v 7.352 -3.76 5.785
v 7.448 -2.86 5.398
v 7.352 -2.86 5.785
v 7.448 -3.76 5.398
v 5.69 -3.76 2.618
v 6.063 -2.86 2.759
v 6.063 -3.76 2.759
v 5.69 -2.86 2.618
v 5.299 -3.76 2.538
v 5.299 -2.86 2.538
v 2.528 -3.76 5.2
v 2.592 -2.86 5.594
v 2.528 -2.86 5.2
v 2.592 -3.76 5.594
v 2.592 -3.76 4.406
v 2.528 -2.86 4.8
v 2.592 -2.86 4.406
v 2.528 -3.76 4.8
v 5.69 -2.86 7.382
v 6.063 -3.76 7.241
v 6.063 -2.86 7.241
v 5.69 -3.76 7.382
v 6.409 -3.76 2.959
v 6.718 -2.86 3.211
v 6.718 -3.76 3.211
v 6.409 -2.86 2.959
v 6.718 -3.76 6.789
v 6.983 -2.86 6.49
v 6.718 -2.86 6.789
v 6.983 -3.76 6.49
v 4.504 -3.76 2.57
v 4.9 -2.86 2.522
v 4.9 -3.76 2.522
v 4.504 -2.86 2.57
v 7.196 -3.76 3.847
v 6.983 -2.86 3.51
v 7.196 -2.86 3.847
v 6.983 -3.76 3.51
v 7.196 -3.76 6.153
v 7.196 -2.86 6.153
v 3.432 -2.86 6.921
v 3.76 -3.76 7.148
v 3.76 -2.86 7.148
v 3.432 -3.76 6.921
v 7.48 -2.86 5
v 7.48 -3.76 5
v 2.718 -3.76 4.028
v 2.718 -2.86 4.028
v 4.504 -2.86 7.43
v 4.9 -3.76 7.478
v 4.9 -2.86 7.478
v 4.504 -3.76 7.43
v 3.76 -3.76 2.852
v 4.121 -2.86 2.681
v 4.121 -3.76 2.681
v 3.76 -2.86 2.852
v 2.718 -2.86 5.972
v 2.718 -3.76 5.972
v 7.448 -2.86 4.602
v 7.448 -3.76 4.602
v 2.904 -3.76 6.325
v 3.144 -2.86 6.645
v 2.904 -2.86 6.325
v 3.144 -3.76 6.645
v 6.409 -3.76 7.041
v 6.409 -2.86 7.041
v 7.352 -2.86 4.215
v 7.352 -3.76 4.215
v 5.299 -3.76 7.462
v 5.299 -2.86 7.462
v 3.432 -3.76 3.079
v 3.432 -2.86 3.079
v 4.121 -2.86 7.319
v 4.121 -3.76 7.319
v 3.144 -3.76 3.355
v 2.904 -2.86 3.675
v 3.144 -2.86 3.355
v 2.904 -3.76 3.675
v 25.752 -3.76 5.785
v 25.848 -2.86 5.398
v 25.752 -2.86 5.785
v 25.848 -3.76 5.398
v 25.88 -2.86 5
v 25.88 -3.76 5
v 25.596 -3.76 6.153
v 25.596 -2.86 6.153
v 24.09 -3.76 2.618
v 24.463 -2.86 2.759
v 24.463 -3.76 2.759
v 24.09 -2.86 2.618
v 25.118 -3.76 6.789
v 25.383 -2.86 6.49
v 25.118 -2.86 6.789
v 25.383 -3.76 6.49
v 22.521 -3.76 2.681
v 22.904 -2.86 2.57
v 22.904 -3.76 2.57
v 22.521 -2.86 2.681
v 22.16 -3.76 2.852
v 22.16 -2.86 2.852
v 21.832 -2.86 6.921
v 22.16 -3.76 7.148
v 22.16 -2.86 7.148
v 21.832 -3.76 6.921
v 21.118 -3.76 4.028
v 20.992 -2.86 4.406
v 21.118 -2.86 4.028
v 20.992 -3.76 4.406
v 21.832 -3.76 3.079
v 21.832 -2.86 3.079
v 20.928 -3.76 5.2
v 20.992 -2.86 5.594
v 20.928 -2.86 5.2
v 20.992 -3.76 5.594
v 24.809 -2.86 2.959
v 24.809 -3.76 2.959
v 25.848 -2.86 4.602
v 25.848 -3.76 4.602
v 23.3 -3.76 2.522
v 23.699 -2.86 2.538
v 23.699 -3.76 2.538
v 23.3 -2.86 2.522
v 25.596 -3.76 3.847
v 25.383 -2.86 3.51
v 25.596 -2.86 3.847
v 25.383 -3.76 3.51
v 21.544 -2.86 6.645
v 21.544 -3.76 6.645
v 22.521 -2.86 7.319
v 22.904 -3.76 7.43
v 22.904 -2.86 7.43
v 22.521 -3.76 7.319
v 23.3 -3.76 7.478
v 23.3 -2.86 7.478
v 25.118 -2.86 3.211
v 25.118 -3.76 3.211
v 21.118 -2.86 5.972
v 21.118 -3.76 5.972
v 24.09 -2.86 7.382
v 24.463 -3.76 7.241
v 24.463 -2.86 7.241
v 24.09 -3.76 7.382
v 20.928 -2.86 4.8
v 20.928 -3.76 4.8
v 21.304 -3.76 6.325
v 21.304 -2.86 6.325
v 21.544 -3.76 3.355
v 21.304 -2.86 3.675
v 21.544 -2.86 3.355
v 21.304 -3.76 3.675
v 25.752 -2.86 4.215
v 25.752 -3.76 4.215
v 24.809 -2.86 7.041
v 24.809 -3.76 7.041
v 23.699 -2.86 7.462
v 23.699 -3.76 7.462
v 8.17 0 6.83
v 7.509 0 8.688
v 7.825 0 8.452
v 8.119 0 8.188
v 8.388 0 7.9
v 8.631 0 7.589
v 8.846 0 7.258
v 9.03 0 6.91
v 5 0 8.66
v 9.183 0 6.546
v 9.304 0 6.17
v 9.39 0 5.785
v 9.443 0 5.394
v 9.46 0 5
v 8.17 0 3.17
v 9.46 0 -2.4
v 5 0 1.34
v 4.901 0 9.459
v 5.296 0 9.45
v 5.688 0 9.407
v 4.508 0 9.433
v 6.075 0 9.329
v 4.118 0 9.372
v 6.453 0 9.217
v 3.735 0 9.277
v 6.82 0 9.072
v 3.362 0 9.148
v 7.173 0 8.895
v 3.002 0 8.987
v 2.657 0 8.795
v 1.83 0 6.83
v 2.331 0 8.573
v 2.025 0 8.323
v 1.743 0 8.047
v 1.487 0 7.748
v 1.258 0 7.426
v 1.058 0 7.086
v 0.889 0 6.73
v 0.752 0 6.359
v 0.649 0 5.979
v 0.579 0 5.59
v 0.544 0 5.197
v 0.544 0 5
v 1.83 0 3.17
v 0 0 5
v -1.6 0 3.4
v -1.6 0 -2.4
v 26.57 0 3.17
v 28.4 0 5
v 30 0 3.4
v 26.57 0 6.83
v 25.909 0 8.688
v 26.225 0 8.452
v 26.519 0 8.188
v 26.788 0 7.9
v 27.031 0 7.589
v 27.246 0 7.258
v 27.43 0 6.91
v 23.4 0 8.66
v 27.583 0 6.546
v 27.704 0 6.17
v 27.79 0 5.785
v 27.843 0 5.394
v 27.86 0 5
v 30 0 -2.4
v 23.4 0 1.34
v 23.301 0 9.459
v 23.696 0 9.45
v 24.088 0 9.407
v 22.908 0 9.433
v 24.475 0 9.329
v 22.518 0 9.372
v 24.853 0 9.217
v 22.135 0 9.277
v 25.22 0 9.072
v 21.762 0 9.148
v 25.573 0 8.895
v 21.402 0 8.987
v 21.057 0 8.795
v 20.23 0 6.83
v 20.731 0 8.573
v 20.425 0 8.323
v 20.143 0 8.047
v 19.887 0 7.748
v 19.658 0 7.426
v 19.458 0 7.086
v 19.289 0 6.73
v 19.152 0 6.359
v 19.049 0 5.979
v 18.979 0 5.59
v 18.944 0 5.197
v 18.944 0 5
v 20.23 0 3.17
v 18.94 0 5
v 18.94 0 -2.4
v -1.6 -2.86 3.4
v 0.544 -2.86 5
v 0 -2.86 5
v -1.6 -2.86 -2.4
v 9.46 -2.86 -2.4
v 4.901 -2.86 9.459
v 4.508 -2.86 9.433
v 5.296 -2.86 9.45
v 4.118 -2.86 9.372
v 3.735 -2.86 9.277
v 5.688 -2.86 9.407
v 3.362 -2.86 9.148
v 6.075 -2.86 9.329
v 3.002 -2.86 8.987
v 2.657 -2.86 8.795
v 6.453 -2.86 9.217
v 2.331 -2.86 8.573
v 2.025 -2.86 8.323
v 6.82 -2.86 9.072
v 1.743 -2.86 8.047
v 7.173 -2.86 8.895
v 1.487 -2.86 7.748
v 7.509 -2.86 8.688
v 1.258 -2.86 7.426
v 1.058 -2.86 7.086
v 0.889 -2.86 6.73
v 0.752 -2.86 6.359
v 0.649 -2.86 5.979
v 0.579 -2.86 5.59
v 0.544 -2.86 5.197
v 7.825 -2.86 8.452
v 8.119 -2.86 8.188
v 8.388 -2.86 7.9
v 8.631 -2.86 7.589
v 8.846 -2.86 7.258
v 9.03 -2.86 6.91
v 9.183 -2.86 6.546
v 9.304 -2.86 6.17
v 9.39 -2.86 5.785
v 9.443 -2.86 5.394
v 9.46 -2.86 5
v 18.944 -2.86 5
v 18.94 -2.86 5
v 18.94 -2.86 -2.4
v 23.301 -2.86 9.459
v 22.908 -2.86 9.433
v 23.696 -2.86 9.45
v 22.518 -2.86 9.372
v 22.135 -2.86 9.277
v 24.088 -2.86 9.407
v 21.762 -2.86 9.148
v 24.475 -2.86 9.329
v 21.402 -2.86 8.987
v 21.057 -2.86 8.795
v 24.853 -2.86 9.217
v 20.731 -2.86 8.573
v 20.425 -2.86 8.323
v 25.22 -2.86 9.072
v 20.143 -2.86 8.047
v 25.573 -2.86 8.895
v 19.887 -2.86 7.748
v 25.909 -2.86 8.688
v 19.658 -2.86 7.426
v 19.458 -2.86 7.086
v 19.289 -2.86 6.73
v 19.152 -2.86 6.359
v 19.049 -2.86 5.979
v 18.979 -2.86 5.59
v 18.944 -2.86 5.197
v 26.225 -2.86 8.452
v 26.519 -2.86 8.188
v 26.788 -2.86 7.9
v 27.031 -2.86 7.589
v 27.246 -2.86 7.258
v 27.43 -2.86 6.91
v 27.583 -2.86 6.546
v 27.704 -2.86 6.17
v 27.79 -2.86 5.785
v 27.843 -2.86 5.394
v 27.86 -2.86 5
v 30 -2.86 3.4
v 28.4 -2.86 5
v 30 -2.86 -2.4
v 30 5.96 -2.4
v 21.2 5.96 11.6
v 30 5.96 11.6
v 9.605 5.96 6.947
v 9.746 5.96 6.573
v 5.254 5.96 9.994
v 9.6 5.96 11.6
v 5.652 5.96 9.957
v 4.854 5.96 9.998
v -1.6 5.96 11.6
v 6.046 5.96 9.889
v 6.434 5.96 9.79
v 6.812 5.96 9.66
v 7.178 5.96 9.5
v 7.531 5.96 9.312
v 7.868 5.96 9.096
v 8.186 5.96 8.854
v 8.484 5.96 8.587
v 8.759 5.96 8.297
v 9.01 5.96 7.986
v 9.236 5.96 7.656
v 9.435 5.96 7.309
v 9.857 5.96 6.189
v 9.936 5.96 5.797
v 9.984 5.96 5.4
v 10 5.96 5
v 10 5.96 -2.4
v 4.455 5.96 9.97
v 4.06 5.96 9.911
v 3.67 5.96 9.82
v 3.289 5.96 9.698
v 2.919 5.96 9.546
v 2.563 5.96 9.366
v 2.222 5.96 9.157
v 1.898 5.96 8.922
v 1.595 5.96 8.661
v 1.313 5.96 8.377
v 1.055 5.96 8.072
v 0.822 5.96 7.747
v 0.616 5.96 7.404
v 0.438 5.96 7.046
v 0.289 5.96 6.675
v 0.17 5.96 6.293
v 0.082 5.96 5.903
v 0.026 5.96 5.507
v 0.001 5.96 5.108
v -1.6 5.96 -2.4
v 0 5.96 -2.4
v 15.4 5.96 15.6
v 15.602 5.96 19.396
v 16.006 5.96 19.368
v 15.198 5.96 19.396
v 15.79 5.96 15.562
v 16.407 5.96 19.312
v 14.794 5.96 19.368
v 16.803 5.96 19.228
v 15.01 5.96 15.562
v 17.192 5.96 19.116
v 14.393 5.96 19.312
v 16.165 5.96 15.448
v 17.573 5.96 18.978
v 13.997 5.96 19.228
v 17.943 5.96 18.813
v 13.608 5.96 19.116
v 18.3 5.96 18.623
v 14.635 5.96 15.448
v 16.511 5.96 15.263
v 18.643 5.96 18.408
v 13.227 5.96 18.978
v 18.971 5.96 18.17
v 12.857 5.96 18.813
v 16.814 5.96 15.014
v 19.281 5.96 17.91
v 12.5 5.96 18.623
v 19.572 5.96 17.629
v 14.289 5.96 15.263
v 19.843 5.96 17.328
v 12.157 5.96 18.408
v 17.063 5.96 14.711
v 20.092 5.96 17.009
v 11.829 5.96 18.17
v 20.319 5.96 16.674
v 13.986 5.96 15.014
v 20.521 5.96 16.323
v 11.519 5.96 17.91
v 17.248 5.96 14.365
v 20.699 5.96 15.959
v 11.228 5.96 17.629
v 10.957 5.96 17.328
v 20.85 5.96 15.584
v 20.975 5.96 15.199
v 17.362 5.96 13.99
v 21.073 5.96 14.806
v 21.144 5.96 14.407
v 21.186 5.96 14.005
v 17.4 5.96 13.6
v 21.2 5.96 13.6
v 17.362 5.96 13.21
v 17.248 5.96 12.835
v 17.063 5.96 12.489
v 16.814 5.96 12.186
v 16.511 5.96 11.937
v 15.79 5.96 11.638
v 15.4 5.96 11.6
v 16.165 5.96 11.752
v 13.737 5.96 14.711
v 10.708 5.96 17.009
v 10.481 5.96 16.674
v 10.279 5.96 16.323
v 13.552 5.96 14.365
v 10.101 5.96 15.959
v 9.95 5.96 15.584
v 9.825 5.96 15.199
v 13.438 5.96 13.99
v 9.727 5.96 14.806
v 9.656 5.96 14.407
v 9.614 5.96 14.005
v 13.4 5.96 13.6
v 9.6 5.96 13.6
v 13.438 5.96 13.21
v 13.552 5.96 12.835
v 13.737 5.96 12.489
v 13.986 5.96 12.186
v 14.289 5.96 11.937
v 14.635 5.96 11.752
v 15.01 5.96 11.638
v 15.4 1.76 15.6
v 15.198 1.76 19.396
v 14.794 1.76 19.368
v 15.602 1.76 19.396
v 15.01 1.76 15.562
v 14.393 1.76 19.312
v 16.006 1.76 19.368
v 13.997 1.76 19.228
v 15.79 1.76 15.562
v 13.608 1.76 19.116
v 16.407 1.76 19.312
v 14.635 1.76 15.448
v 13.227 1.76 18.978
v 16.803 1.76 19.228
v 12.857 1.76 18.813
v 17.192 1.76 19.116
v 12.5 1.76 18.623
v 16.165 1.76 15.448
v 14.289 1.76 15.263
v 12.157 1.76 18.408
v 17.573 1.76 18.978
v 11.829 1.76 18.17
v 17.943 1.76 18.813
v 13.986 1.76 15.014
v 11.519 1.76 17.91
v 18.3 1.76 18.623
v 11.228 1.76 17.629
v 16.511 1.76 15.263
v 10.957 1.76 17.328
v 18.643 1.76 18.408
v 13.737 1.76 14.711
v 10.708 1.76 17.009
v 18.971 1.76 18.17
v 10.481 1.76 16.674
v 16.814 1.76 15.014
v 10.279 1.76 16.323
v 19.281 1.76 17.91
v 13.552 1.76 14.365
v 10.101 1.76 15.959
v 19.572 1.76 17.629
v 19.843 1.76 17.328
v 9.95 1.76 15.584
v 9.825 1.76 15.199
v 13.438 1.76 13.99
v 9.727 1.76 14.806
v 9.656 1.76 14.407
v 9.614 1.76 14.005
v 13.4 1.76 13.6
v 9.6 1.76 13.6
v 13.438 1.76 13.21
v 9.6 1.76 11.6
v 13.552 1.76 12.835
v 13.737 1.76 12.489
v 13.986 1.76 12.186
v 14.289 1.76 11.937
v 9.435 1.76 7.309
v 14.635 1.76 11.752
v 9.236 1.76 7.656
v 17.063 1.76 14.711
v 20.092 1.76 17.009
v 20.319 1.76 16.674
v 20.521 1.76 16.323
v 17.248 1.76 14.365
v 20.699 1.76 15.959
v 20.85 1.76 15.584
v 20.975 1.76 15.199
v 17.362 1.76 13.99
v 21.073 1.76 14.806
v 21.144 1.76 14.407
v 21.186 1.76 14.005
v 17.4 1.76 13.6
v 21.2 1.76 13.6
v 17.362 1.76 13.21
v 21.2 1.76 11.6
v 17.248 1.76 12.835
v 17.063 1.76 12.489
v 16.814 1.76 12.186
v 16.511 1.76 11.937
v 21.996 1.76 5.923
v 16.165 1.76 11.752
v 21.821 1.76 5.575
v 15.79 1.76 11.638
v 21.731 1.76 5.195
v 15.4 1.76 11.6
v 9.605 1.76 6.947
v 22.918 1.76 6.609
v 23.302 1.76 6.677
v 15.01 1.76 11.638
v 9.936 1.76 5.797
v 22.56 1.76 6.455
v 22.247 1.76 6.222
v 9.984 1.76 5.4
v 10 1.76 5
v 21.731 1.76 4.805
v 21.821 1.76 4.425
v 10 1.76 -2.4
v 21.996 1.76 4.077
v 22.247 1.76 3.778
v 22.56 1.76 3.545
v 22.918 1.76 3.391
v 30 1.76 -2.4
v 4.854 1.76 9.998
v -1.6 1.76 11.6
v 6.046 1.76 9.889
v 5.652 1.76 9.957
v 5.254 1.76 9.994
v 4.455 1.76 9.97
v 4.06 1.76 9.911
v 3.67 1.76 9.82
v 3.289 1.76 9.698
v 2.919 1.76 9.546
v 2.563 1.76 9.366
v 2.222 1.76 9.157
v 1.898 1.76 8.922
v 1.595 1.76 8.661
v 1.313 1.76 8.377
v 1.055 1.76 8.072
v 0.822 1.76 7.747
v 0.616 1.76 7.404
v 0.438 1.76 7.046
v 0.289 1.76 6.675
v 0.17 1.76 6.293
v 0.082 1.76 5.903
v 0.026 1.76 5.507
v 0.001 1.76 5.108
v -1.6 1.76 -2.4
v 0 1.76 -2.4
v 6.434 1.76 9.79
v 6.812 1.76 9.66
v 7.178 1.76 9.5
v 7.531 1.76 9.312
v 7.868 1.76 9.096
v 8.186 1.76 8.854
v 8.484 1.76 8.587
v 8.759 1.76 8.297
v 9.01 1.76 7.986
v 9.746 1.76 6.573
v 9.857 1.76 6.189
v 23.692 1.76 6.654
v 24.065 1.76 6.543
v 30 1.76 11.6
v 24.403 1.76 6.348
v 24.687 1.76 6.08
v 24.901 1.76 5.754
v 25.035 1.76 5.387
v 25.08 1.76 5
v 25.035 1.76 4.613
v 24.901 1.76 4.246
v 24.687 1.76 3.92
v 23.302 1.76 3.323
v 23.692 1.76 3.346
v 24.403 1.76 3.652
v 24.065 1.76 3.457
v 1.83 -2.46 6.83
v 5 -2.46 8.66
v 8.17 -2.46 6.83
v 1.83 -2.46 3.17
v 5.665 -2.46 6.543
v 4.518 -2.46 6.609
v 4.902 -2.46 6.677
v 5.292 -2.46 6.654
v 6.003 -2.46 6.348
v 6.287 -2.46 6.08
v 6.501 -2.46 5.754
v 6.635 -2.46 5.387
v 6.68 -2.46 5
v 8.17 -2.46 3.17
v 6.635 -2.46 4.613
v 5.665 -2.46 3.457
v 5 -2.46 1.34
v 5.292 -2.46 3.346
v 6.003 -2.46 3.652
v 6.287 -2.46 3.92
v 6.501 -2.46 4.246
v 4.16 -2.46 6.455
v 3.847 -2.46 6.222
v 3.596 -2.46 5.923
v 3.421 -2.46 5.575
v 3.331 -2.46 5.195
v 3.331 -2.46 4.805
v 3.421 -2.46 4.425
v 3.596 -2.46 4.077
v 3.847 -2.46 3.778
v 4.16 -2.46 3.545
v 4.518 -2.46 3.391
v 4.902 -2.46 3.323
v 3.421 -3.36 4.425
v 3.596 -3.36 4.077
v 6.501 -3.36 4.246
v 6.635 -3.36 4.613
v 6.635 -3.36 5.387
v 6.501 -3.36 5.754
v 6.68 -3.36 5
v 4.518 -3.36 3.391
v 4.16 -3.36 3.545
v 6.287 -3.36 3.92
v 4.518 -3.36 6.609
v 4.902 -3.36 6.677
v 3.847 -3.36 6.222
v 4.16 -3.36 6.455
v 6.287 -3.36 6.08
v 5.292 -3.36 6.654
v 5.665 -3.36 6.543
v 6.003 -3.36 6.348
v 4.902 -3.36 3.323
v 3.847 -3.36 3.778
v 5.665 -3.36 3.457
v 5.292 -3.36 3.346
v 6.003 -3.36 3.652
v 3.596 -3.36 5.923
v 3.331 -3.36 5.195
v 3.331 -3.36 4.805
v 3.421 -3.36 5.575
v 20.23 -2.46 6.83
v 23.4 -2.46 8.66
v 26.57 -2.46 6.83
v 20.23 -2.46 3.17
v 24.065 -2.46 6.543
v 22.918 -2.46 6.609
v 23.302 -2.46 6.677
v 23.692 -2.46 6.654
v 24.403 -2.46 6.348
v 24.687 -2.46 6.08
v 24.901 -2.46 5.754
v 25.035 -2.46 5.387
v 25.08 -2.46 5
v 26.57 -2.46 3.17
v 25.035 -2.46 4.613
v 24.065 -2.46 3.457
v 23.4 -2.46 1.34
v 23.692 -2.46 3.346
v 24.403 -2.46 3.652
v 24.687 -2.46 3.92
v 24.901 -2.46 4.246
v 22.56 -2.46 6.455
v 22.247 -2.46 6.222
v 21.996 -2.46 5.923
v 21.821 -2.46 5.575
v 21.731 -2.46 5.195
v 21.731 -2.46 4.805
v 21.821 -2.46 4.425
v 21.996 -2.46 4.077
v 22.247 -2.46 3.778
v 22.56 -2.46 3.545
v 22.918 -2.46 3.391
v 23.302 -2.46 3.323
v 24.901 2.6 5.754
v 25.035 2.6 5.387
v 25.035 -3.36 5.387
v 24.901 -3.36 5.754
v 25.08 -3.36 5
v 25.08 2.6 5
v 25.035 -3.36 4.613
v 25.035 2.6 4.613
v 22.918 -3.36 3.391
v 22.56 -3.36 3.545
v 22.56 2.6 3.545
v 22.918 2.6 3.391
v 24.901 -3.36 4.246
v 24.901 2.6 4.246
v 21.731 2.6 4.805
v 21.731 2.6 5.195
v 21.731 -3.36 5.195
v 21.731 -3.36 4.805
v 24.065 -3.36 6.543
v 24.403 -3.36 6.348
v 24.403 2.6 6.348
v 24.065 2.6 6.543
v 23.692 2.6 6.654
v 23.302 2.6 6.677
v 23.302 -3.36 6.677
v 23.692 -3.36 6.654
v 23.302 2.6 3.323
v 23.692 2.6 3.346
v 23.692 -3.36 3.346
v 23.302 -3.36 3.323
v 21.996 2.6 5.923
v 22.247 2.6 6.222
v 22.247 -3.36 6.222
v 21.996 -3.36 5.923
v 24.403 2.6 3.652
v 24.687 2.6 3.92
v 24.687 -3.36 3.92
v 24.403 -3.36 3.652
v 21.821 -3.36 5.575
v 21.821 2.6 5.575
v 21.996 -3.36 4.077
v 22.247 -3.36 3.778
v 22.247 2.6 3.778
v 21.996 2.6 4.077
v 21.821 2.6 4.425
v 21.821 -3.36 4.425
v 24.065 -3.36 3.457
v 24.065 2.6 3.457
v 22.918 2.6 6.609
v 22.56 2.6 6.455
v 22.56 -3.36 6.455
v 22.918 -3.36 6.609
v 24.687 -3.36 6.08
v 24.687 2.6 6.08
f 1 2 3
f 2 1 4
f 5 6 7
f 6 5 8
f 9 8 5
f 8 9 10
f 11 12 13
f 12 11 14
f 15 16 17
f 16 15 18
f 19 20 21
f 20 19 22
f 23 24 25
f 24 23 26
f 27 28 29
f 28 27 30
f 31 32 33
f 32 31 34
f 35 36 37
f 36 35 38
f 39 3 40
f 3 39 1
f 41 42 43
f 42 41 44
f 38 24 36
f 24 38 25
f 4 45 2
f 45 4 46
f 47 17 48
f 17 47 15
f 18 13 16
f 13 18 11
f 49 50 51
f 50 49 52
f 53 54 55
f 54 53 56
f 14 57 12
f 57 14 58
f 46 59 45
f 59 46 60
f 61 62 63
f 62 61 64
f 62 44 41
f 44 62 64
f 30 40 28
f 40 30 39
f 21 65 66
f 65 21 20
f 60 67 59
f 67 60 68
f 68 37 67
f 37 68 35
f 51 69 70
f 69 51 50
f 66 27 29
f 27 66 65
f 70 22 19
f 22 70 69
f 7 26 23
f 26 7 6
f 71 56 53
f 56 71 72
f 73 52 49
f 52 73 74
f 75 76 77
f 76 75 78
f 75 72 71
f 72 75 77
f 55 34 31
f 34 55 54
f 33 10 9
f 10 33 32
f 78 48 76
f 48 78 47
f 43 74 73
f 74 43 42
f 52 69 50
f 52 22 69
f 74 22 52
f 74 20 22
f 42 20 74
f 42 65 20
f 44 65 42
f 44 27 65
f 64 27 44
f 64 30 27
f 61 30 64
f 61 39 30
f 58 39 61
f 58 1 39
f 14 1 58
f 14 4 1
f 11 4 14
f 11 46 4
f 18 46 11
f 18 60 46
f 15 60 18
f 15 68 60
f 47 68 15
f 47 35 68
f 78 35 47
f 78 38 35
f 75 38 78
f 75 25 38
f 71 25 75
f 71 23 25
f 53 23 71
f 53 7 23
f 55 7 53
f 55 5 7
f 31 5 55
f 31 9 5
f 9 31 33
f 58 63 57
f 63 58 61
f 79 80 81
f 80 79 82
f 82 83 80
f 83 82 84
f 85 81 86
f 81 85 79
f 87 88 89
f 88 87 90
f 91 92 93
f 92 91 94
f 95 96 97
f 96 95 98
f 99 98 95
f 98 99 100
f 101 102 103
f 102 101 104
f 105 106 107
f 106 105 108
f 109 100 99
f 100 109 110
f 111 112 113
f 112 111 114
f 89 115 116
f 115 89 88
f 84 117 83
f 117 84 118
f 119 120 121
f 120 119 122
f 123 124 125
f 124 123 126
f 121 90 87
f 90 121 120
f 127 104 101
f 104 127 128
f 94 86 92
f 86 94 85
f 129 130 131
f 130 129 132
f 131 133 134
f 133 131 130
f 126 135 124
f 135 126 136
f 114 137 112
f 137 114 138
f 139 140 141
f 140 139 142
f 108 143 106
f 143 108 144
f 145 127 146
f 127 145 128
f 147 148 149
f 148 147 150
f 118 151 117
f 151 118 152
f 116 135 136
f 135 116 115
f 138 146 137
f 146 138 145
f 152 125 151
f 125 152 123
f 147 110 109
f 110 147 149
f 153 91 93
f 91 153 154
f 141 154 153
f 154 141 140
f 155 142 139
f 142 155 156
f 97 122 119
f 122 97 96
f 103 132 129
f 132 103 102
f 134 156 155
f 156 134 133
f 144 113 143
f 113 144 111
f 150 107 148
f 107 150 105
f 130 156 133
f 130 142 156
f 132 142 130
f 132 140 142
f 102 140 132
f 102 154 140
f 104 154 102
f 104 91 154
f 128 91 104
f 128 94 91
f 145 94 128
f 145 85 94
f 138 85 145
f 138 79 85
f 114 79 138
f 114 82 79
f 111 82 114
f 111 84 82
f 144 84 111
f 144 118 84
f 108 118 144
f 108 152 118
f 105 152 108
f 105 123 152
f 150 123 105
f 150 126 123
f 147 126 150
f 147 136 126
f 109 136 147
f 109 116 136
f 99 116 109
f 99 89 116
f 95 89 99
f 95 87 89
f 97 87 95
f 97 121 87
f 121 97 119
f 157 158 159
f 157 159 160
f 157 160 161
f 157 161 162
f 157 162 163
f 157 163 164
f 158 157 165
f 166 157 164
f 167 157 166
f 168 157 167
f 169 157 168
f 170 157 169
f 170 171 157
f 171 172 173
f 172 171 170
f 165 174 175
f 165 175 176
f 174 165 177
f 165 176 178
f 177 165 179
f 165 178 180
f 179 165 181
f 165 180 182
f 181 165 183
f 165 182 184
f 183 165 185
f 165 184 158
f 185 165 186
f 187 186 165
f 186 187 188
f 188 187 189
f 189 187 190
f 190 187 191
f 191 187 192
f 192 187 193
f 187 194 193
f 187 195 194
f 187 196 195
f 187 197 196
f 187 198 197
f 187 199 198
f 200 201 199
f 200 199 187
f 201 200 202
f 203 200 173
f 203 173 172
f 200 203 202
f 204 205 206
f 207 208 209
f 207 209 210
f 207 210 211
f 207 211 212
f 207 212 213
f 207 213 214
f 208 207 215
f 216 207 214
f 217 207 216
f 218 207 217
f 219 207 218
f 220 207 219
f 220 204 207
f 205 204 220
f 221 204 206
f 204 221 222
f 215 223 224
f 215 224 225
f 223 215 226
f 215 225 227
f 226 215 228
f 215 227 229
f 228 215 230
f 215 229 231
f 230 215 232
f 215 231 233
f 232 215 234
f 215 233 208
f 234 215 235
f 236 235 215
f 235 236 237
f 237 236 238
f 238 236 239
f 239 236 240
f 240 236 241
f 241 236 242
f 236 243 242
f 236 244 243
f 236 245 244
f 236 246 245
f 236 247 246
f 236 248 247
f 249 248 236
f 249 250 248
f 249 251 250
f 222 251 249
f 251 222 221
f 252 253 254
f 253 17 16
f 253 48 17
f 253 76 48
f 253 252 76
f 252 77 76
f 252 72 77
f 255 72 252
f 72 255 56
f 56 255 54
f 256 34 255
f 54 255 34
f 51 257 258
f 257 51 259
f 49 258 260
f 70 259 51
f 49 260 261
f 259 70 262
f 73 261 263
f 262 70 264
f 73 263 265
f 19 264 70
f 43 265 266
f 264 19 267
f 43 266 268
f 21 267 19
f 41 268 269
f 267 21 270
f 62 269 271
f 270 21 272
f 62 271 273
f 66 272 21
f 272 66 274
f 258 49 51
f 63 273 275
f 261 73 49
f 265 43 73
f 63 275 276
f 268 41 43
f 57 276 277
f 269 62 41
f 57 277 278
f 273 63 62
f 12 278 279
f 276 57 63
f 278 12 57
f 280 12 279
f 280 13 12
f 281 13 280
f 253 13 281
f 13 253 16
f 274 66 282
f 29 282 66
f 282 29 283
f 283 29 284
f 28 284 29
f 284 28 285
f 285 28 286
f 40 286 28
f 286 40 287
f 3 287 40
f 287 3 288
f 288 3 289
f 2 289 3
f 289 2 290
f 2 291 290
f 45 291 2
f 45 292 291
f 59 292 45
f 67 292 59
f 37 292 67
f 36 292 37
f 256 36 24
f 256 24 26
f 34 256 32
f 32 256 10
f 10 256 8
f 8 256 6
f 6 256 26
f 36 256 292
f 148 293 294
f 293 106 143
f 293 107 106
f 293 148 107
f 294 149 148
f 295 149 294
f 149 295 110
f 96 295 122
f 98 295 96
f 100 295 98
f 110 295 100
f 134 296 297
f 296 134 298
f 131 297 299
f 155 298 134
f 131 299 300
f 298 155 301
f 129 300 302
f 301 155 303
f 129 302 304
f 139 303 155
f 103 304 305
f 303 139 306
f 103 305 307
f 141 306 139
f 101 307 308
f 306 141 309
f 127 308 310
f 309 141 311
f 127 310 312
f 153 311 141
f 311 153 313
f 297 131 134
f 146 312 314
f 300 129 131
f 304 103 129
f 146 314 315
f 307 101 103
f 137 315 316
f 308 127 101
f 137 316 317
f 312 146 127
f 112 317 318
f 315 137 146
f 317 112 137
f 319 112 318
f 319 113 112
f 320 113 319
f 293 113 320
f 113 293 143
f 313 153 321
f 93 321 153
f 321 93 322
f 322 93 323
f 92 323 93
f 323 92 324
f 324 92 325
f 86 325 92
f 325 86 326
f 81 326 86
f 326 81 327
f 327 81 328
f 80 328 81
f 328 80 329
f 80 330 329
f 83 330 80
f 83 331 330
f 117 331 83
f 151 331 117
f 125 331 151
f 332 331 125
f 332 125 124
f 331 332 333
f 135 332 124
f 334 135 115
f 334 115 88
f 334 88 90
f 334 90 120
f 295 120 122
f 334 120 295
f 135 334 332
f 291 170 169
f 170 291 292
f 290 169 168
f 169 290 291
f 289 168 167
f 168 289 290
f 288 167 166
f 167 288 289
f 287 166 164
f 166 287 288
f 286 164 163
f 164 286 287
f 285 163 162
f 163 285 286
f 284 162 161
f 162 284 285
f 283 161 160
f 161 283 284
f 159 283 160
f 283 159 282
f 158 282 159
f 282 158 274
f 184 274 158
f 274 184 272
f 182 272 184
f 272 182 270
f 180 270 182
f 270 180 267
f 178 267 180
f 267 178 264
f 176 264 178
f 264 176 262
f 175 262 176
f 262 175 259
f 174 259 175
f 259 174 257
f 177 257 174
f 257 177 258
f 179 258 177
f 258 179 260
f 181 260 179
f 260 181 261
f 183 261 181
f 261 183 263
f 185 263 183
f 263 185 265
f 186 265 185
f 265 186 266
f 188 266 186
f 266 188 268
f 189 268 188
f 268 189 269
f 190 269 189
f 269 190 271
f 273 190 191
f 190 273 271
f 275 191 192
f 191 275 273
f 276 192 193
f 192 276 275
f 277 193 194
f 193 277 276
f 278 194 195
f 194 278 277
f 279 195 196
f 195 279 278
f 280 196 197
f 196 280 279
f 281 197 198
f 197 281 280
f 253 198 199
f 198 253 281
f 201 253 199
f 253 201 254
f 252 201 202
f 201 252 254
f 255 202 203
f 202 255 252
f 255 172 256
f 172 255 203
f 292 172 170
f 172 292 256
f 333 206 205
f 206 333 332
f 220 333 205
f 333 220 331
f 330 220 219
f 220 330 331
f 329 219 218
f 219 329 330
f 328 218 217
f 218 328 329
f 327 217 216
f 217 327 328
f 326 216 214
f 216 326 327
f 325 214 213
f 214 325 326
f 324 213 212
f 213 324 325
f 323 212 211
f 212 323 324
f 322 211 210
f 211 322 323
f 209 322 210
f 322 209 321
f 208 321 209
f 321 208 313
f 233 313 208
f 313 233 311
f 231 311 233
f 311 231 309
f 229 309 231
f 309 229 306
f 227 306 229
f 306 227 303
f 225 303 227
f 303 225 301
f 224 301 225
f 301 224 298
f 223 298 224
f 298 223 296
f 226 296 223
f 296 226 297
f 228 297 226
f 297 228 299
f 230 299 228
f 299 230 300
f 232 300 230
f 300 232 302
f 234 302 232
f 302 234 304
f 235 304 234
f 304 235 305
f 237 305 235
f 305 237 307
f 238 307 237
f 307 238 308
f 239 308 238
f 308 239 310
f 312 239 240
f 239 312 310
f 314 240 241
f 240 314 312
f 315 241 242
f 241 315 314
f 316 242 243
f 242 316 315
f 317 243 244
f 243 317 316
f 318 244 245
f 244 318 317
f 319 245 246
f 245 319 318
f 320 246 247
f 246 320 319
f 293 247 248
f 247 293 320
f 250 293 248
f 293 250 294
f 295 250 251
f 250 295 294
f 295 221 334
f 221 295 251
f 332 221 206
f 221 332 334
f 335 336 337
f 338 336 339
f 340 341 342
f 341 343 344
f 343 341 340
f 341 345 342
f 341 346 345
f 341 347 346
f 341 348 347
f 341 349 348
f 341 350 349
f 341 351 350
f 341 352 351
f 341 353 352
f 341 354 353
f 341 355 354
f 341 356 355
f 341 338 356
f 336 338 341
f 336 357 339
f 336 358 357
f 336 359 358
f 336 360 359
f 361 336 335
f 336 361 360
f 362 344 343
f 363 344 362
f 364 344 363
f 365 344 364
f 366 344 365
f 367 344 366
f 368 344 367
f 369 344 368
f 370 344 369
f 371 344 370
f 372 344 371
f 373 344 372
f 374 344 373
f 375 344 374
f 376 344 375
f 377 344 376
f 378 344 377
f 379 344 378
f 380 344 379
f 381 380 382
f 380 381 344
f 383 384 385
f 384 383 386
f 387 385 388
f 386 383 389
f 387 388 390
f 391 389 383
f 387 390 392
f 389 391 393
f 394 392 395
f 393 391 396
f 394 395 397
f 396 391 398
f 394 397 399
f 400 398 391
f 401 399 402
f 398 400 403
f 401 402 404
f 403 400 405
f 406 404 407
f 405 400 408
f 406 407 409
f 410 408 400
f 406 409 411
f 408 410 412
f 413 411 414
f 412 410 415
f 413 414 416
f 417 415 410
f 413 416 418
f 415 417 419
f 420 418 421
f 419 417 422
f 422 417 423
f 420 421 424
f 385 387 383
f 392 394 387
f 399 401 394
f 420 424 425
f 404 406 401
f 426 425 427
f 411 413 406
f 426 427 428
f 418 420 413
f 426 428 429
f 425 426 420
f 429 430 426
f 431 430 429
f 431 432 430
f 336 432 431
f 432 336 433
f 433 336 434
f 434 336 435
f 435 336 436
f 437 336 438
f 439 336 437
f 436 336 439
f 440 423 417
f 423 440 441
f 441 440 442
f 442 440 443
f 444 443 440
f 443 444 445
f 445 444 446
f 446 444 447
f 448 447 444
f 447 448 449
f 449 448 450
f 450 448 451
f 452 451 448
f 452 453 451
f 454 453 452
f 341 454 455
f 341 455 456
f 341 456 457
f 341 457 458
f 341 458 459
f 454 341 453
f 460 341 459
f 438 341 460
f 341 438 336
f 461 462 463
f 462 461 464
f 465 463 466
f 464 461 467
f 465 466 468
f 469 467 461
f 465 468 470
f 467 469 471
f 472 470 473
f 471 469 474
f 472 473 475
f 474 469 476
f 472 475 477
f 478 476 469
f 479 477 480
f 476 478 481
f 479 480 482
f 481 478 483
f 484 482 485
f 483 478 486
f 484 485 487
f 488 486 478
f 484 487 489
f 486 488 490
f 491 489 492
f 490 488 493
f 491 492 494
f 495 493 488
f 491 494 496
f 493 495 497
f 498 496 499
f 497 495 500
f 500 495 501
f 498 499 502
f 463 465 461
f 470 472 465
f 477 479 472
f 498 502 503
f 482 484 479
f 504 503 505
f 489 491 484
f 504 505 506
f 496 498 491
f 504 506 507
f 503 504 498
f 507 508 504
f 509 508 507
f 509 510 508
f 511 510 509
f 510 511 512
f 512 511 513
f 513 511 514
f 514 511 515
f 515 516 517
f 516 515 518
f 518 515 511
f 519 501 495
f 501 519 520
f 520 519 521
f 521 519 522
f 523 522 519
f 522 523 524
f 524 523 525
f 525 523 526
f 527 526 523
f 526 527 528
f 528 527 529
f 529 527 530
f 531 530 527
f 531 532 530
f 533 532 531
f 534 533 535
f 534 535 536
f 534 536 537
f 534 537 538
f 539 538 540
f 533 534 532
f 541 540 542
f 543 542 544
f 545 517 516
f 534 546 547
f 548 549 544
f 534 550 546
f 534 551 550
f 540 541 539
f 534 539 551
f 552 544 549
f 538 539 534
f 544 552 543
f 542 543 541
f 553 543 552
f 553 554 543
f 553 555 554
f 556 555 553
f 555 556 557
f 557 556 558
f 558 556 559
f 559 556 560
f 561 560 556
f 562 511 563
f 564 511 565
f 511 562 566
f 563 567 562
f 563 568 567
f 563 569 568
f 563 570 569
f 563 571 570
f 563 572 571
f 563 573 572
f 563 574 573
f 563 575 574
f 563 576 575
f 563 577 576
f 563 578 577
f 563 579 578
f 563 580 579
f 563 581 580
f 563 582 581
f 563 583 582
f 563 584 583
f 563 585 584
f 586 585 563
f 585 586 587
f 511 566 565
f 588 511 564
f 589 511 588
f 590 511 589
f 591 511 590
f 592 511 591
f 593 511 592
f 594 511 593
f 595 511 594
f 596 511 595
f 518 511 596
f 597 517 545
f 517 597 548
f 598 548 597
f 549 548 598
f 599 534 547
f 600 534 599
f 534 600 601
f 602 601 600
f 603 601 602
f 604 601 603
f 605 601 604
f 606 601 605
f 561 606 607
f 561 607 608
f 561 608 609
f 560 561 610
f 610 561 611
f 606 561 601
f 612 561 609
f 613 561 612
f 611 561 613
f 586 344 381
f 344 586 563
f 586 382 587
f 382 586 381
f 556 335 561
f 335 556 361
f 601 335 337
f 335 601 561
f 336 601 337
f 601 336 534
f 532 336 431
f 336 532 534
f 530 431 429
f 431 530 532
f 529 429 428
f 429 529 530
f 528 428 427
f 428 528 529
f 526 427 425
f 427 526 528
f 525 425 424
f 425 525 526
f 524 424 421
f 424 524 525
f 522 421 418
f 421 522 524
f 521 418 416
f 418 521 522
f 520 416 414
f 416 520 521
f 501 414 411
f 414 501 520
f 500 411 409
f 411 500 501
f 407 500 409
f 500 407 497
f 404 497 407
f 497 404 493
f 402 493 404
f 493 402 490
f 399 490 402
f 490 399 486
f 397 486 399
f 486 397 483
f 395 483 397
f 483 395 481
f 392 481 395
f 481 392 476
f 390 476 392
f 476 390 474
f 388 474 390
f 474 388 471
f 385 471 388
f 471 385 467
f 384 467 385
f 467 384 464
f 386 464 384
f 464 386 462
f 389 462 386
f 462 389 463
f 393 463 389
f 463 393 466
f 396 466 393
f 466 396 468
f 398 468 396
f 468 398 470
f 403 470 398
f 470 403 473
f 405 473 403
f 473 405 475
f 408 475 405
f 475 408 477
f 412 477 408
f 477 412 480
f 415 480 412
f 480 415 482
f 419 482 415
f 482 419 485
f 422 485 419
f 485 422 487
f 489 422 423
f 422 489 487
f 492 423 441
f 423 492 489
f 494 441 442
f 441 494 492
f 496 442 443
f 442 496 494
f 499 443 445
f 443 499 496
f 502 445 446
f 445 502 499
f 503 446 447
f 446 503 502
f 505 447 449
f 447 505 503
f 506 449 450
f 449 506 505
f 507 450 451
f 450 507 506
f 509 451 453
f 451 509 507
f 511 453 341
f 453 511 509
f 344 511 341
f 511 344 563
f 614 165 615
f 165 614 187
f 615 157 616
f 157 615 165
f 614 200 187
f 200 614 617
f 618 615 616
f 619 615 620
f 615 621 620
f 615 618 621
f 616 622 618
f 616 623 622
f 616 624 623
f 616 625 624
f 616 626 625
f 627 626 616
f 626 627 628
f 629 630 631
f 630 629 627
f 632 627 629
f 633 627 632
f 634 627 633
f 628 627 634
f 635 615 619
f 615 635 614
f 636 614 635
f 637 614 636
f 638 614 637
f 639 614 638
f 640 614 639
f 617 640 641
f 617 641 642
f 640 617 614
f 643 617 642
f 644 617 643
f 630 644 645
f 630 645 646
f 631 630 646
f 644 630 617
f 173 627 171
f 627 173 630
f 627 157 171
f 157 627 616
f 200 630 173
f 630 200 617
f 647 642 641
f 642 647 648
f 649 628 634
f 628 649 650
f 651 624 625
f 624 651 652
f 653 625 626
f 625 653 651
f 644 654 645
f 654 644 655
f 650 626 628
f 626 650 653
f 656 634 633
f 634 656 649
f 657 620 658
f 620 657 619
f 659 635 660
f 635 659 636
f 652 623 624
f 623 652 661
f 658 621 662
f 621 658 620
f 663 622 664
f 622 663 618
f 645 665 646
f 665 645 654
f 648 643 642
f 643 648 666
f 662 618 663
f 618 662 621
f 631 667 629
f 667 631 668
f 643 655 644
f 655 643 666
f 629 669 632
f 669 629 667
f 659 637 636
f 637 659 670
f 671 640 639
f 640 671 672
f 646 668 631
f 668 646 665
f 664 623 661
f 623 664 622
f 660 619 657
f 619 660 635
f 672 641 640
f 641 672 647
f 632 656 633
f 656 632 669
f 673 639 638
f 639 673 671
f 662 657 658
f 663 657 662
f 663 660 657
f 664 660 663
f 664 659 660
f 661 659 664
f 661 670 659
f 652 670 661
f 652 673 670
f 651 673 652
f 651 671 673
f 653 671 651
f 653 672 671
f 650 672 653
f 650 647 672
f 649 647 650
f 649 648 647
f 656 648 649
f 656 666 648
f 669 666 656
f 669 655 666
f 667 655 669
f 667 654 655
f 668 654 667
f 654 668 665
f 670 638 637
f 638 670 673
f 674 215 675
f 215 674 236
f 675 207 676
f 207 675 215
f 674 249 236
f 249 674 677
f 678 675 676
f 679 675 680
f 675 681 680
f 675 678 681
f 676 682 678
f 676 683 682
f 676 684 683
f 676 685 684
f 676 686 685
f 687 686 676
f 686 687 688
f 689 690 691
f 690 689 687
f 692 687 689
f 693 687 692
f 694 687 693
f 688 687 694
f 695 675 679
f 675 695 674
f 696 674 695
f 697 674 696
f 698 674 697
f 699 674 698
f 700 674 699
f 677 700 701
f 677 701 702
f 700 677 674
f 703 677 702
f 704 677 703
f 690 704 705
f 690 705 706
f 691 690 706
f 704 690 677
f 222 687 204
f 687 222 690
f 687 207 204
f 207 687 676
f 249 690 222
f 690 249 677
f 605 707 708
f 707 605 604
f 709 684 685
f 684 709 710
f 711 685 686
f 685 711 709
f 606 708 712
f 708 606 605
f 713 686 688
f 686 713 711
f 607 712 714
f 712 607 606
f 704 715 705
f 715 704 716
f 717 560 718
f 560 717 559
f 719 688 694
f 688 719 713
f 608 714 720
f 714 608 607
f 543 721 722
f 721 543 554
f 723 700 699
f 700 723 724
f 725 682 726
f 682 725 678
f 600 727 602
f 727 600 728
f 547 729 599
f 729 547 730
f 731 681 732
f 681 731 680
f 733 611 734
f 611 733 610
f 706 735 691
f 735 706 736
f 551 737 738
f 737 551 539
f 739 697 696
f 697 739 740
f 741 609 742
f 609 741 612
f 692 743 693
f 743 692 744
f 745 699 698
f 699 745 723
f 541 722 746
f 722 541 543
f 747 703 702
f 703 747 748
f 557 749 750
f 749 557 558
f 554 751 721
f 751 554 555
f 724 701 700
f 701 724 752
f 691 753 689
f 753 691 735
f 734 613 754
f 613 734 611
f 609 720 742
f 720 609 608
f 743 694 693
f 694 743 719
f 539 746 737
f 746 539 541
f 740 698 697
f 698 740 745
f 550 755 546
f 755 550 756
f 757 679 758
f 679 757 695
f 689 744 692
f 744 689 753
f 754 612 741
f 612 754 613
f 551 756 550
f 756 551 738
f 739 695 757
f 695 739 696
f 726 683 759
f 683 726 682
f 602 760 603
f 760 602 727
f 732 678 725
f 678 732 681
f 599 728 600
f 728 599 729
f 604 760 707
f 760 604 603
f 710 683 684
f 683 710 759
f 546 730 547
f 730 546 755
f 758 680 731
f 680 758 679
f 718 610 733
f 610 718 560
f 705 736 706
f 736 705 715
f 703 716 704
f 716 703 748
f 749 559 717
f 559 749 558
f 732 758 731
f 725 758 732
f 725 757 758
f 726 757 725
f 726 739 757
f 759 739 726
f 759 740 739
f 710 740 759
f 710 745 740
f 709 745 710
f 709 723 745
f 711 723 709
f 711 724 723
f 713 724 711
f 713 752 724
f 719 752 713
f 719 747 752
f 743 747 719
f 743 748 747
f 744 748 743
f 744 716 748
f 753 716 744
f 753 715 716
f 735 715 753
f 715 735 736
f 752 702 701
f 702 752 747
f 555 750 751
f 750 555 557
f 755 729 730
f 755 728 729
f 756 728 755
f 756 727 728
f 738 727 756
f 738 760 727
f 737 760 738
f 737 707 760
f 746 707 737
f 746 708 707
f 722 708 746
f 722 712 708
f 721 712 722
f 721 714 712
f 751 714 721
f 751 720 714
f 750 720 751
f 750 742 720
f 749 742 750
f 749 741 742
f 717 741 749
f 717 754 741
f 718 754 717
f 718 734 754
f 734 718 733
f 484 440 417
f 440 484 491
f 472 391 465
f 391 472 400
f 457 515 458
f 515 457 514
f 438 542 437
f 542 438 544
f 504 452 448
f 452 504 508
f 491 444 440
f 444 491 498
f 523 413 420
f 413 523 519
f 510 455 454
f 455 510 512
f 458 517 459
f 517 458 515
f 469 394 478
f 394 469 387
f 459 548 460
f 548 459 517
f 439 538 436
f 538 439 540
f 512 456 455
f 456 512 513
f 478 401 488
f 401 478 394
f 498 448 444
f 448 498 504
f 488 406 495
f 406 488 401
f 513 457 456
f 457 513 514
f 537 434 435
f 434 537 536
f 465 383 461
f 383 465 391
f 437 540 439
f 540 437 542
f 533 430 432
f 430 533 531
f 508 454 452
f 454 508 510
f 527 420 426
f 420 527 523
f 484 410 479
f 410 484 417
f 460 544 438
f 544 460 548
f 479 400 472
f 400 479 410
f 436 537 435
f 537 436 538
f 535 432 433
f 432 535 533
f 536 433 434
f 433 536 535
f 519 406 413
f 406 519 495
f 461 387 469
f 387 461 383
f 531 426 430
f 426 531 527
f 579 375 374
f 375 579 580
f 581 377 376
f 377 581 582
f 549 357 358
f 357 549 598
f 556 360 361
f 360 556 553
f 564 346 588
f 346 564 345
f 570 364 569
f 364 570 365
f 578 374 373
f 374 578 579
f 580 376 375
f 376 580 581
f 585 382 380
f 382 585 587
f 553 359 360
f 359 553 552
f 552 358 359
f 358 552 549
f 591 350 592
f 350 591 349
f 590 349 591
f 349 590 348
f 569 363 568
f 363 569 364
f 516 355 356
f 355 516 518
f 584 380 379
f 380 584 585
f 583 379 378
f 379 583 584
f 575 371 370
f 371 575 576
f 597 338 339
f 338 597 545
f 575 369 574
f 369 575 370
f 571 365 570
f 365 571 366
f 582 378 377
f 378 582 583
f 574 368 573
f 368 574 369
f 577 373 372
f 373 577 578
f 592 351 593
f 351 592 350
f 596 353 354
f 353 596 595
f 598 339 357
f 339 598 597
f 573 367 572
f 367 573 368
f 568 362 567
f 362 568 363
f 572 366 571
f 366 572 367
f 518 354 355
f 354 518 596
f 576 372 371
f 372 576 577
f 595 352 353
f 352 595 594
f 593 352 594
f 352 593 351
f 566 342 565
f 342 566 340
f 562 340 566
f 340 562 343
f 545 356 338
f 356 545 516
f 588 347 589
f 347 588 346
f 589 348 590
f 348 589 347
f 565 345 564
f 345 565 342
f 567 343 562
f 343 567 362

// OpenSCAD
// Copyright (C) 2025 Arif K. Rafiq
// This program is free software: you can redistribute it and/or modify
// it under the terms of the GNU General Public License as published by
// the Free Software Foundation, either version 3 of the License, or
// (at your option) any later version.

// This program is distributed in the hope that it will be useful,
// but WITHOUT ANY WARRANTY; without even the implied warranty of
// MERCHANTABILITY or FITNESS FOR A PARTICULAR PURPOSE.  See the
// GNU General Public License for more details.

// You should have received a copy of the GNU General Public License
// along with this file.  If not, see <https://www.gnu.org/licenses/>,
// or write to: license@temperedoptimism.com


/* 
(b)readth       :(w)est (X-)   (c)enter (X0) (e)east (X+)
(h)eight        :(d)own (Z-)   (g)round(Z0)  (u)p (Z+)

Vectors (v)     :(x), (y), (z)
Thicknesses (t) : Thicknesses to resolve 3D printer limits or rendering issues.
Proportion (p)  : container for grouping (r)adius and (i)ntensity into a singl 2d vector acccessed using .x and .y respectively
*/
/* 17:08 */
// Fixed in example3.scad       // Set limits in customizer
/* [Thicknesses (x),(y),(z)] */
tFitGap = [0.16, 0.16, 0.16];   //[0.00:0.01:0.64] 
tWallMin = [0.40, 0.40, 0.16];  //[0.16:0.08:1.60] 
/* [Proportional (x):(Radius, (y):(i)ntensity] */
pHexSink = [3.5, 2.3];          //[0.10:0.02:20.00] 
pFastShaft064 = [1.36, 5.80]; //0.10:0.02:20.00]
pFastShaft095 = [1.36, 9.30]; //0.10:0.02:20.00]
pWashSink = [4.00, 1.00]; //0.10:0.02:20.00]
/* [2D vectors (x), (y)] */
vTerminalW = [5.0, 5.0];     //[0.00:0.10:100] 
vTerminalE = [23.4, 5.0];    //[0.00:0.10:100]
vThermal = [ 15.4, 13.6];    //[0.00:0.10:100.00]
/* [Scalars] */
leadingEdge = 2.4; //[0.8:0.4:5.0]
flankEdge = 1.6; //[0.8:0.4:5.0]
trailingEdge = 1.6; //[0.8:0.4:3.6]
bBoard = 28.4; //[20:0.1:100.0]
hBoard = 1.6; //0.8:04:3.2]
// Adding space
hSpacer = 4.2; //[2.8:0.4:14]
rCorner = 1.6; //0.1
rTerminal = 5.0; //0.1
rThermal = 5.0;  //0.1
/* [Special ] */
fa0 = 4.0;     //[1:1:60]  
fs0 = 0.4;     //[0.1:0.1:4.0]  
fx0 = 3;       //[1,2,3,4,5,6,7,8,9,10]
/* [Hidden] */ 
tEps=0.01; 

/* Calucualted at run time. */
pHexSurround = [pHexSink.x + (tWallMin.x * 2) + tFitGap.x, pHexSink.y + tWallMin.y + tFitGap.y];
pExtension = [pFastShaft064.x + ((tWallMin.x + tFitGap.x)* 2), pFastShaft064.y + tWallMin.y + tFitGap.y - pHexSurround.y -hBoard - pWashSink.y];

//30.00-35.00 Circles, Also look at the customizer!!
// Rotate
rotate([90,0,0]){
  difference(){
    union() {
      // hex pocket surround
      linear_extrude(pHexSurround.y, convexity=fx0){ 
        polygon([[vTerminalW.x + pHexSurround.x, vTerminalW.y],
              [ vTerminalW.x + pHexSurround.x, -leadingEdge],
              [-flankEdge, -leadingEdge],
              [-flankEdge, vTerminalW.y - rCorner],
              [-flankEdge + rCorner, vTerminalW.y]]);
        polygon([[vTerminalE.x - pHexSurround.x, vTerminalE.y],
              [ vTerminalE.x - pHexSurround.x, -leadingEdge],
              [bBoard + flankEdge, -leadingEdge],
              [bBoard + flankEdge, vTerminalE.y - rCorner],
              [bBoard + flankEdge - rCorner, vTerminalE.y]]);       
              
        for(v = [vTerminalW, vTerminalE]){
          translate(v)  circle(pHexSurround.x, $fa=fa0, $fs=fs0 );
        }
      }
      // shaft extension
      for(v= [vTerminalW, vTerminalE]){
          translate([v.x, v.y, pHexSurround.y - tEps]) cylinder(pExtension.y + tEps, r=pExtension.x, $fa=fa0, $fs=fs0);
      }
      // board spacer
      translate([0, 0, -hBoard - tFitGap.y - hSpacer]) linear_extrude(hSpacer, convexity=fx0){
          polygon([[-flankEdge, -leadingEdge],
            [bBoard + flankEdge, -leadingEdge],
            [bBoard + flankEdge, vTerminalE.y + rTerminal + trailingEdge],
            [vThermal.x + rThermal +(tWallMin.x * 2), vTerminalE.y + rTerminal + trailingEdge],
            [vThermal.x + rThermal +(tWallMin.x * 2), vThermal.y],
            [vThermal.x - rThermal -(tWallMin.x * 2), vThermal.y],
           [vThermal.x - rThermal -(tWallMin.x * 2), vTerminalW.y + rTerminal + trailingEdge],
           [-flankEdge, vTerminalW.y + rTerminal + trailingEdge]]);
          translate(vThermal) circle(rThermal + (tWallMin.x * 2), $fa=fa0, $fs=fs0);
      }
          
    }
    for(v = [vTerminalW, vTerminalE]){
        // hex pocket
        #translate([v.x, v.y, -tEps]) rotate([0,0,30]) cylinder(pHexSurround.y - tWallMin.y + tEps, r=pHexSurround.x - (tWallMin.x * 2), $fn=6);
        // fastner hole
        #translate([v.x, v.y, -hBoard -pWashSink.y]) cylinder(pFastShaft064.y + tFitGap.y, r=pFastShaft064.x + (tFitGap.x * 2), $fa=fa0, $fs=fs0);
     
    }
   #translate([vThermal.x, vThermal.y, -hBoard + pWashSink.y]) rotate([0,180,0]) 
        cylinder(pFastShaft095.y + tFitGap.y, r=pFastShaft095.x + (tFitGap.x * 4), $fa=fa0, $fs=fs0);

    // terminal guide
   #translate([vTerminalW.x, vTerminalW.y, -hBoard - tFitGap.y -hSpacer -tEps ]) linear_extrude(hSpacer + (tEps *2), convexity=fx0) {
        polygon([for(a = [0:max(fa0, (fs0*360)/(2*PI*rTerminal)):180]) [rTerminal * cos(a), rTerminal *sin(a)]
        ,[-rTerminal, -vTerminalW.y -leadingEdge -tEps]
        ,[rTerminal, -vTerminalW.y -leadingEdge -tEps]]);
        }
  }
}
